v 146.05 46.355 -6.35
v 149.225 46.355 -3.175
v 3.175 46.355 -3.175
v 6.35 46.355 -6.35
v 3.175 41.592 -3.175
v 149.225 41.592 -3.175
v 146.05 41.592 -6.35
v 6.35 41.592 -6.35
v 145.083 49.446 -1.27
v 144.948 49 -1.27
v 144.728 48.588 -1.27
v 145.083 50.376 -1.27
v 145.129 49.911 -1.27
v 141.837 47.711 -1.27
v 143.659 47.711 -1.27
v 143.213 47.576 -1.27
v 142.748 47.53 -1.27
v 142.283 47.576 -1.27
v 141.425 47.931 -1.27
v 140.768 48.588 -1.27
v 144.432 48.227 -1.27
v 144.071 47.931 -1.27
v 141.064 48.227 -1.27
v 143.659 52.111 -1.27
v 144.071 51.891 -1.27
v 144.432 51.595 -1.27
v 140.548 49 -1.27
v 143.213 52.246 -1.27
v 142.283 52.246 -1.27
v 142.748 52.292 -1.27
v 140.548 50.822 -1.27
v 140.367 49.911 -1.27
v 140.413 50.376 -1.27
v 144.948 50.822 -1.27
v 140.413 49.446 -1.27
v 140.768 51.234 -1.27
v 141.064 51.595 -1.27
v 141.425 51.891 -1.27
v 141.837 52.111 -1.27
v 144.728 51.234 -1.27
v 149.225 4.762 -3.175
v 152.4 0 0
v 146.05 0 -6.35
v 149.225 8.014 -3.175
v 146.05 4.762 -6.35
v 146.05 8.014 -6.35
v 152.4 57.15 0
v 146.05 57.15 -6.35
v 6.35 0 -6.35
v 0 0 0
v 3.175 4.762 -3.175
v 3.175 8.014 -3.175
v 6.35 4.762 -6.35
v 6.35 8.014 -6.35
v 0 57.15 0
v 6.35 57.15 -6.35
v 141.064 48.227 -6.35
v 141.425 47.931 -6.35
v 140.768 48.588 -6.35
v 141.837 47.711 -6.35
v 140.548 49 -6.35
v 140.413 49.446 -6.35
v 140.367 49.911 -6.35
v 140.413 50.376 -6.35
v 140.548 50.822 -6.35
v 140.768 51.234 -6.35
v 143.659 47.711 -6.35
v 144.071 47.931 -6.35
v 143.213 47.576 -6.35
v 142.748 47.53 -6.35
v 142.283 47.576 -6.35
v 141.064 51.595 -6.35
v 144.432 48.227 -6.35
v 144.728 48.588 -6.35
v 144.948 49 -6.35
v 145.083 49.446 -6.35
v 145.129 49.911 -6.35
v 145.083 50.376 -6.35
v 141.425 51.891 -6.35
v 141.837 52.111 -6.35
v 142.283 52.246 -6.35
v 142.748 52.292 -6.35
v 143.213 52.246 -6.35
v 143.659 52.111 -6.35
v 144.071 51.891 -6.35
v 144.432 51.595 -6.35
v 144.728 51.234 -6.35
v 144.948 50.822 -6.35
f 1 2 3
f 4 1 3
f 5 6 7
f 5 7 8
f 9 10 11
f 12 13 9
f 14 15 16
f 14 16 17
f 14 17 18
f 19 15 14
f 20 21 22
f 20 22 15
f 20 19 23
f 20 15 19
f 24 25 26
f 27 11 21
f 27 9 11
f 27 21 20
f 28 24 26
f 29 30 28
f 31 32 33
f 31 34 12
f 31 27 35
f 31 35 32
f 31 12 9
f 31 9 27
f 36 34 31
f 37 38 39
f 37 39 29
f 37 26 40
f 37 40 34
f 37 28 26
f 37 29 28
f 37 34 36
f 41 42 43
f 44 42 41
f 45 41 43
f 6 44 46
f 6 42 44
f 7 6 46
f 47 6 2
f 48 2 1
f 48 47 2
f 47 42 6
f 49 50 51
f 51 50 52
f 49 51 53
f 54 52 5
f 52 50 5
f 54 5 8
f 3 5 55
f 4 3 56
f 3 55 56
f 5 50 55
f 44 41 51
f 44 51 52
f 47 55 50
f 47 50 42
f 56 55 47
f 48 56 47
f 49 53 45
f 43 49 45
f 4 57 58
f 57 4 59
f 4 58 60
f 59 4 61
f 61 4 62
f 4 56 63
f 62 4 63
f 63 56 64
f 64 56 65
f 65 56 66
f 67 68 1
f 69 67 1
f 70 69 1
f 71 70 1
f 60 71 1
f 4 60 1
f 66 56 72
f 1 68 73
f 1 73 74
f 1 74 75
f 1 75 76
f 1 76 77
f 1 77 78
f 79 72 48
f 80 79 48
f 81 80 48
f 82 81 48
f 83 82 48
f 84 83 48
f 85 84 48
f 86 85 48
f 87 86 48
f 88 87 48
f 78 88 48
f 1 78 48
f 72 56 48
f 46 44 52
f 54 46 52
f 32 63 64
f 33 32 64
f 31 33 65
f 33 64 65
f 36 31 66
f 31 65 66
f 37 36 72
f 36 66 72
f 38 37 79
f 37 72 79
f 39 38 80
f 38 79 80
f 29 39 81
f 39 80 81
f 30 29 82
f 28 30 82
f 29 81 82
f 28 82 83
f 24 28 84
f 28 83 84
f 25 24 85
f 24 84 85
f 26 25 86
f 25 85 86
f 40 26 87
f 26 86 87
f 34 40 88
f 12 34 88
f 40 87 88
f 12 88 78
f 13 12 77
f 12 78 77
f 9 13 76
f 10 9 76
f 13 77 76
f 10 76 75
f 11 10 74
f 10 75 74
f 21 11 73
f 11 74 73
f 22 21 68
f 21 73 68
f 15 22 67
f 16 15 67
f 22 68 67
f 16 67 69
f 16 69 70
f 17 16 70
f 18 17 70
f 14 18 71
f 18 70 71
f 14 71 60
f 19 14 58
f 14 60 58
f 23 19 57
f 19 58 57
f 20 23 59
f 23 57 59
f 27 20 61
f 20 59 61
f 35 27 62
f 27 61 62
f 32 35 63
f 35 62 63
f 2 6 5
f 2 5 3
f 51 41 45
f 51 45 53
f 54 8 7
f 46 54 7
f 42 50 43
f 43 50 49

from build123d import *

# Parameters (mm, degrees)
SKETCH1_W           = 152.4
SKETCH1_H           = 57.15
BOSS_EXTRUDE1_DEPTH = 6.35
CUT_EXTRUDE2_DEPTH  = 58.15
SKETCH4_W           = 3.175
SKETCH4_H           = 4.7625
CUT_EXTRUDE3_DEPTH  = 153.4
SKETCH5_W           = 3.175
SKETCH5_H           = 3.2512
CUT_EXTRUDE4_DEPTH  = 153.4
SKETCH6_R           = 2.38125
CUT_EXTRUDE5_DEPTH  = 5.08


with BuildPart() as part:
    # Sketch1 → Boss-Extrude1 (new body)
    with BuildSketch(Plane.XY):
        with Locations((76.2, 28.575)):
            Rectangle(SKETCH1_W, SKETCH1_H)
    extrude(amount=-BOSS_EXTRUDE1_DEPTH)

    # Sketch3 → Cut-Extrude2 (cut, through all)
    with BuildSketch(Plane(origin=(0, 57.15, 0), x_dir=(1, 0, 0), z_dir=(0, 1, 0))):
        Polygon((152.4, 0), (146.05, 6.35), (152.4, 6.35), align=None)
        Polygon((0, 0), (6.35, 6.35), (0, 6.35), align=None)
    extrude(amount=-CUT_EXTRUDE2_DEPTH, mode=Mode.SUBTRACT)

    # Sketch4 → Cut-Extrude3 (cut, through all)
    with BuildSketch(Plane(origin=(0, 0, 0), x_dir=(0, 0, -1), z_dir=(1, 0, 0))):
        with Locations((4.7625, 43.97375)):
            Rectangle(SKETCH4_W, SKETCH4_H)
    extrude(amount=CUT_EXTRUDE3_DEPTH, mode=Mode.SUBTRACT)

    # Sketch5 → Cut-Extrude4 (cut, through all)
    with BuildSketch(Plane(origin=(0, 0, 0), x_dir=(0, 0, -1), z_dir=(1, 0, 0))):
        with Locations((4.7625, 6.3881)):
            Rectangle(SKETCH5_W, SKETCH5_H)
    extrude(amount=CUT_EXTRUDE4_DEPTH, mode=Mode.SUBTRACT)

    # Sketch6 → Cut-Extrude5 (cut)
    with BuildSketch(Plane(origin=(0, 0, -6.35), x_dir=(-1, 0, 0), z_dir=(0, 0, -1))):
        with Locations((-142.748, 49.911)):
            Circle(SKETCH6_R)
    extrude(amount=-CUT_EXTRUDE5_DEPTH, mode=Mode.SUBTRACT)


solid = part.part
